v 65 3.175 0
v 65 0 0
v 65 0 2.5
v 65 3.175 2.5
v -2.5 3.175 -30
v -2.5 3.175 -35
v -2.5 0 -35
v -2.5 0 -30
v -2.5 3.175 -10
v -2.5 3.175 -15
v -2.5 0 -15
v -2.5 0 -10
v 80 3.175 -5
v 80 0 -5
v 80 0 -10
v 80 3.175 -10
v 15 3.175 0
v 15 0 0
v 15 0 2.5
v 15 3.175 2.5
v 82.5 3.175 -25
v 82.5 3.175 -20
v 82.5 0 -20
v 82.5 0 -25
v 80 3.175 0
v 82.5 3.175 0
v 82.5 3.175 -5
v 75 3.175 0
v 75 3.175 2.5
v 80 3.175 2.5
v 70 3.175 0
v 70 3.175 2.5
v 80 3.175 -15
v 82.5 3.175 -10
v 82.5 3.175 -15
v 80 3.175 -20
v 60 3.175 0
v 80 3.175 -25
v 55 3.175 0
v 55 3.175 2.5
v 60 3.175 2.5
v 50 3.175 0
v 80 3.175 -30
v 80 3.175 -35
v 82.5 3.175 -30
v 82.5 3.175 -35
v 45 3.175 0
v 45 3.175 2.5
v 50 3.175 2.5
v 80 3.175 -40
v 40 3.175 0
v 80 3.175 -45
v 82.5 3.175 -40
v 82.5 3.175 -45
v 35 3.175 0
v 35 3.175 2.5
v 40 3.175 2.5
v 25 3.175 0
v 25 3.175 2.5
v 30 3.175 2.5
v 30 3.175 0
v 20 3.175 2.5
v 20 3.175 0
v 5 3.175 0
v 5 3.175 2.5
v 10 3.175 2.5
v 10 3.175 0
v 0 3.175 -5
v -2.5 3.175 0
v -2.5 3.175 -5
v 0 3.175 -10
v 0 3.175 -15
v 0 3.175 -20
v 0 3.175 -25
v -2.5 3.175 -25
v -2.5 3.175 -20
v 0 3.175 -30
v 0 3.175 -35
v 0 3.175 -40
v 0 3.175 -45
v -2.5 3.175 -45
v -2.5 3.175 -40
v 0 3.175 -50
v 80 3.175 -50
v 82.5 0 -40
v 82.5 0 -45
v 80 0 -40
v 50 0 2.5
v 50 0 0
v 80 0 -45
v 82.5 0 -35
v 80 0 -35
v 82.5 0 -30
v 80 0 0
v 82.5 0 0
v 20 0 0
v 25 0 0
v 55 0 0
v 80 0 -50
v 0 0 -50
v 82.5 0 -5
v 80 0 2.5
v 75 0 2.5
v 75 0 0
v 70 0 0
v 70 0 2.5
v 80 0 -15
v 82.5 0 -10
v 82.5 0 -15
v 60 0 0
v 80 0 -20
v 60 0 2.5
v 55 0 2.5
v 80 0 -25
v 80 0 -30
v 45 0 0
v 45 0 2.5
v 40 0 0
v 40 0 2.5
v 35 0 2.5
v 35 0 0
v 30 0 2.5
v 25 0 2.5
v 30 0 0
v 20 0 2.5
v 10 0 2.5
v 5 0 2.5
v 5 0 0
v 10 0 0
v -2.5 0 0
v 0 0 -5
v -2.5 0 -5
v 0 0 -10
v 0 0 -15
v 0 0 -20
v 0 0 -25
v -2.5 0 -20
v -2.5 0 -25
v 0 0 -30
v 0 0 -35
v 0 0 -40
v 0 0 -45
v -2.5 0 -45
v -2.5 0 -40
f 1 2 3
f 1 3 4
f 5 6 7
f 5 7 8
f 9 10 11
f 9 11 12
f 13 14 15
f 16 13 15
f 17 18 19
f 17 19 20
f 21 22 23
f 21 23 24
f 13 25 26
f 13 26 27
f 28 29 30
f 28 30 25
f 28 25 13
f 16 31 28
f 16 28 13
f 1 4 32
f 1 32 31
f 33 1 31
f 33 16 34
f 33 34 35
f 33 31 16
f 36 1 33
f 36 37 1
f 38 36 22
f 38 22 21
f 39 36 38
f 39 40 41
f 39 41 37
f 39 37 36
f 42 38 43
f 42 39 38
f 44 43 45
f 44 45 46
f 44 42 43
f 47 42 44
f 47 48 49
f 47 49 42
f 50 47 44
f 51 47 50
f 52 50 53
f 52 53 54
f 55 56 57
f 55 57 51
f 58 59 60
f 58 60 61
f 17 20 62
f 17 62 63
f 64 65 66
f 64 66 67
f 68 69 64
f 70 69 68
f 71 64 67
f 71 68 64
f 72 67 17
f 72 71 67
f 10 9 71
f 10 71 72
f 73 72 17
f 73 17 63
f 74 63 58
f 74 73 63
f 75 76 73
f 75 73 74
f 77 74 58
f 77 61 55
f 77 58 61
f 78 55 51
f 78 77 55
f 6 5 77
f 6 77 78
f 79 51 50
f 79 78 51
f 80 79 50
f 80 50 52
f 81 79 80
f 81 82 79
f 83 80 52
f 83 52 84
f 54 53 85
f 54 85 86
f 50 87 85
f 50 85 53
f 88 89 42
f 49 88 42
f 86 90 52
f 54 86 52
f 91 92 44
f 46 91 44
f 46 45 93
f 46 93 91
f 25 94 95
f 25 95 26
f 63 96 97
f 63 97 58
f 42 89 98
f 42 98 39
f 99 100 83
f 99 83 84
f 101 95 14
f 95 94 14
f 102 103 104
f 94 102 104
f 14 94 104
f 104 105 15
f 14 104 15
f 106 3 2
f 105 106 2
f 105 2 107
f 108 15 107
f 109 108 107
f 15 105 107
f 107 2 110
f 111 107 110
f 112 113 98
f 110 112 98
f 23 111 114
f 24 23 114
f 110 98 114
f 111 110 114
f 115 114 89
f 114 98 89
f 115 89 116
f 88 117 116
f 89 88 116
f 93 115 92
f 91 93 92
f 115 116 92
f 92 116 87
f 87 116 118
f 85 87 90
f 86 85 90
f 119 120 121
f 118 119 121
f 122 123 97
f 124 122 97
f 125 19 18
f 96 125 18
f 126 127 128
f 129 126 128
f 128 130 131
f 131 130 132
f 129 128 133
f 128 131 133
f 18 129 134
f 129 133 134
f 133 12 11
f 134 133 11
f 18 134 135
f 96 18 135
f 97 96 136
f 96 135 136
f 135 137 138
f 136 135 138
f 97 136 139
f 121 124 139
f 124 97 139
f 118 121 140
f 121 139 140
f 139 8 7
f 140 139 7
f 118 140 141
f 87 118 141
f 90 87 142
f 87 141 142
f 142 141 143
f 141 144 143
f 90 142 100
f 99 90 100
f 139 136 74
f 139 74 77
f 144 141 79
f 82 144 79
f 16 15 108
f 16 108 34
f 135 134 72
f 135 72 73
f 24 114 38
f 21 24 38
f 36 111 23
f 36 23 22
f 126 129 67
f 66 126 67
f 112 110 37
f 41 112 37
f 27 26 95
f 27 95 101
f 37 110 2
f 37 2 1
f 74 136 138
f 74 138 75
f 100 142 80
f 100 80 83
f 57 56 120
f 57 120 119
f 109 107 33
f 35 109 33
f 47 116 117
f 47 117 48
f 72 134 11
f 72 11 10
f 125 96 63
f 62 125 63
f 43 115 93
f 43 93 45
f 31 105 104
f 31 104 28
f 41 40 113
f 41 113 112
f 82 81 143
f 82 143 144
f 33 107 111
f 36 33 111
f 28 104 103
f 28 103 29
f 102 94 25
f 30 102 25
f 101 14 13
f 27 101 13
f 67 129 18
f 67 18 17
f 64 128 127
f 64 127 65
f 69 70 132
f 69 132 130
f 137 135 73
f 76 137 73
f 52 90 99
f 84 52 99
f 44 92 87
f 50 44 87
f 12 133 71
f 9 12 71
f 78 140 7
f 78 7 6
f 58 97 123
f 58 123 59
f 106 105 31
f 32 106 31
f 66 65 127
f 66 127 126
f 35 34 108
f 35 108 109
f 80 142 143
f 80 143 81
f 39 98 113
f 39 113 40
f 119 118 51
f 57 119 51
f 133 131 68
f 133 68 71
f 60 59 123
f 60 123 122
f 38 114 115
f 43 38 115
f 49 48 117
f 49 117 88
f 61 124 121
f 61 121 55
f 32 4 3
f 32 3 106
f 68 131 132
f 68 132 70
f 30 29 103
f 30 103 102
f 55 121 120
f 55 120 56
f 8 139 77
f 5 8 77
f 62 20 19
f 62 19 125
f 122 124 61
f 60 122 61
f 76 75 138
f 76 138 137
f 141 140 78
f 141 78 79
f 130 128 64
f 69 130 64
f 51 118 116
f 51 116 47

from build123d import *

# Parameters (mm, degrees)
SKETCH1_W           = 80
SKETCH1_H           = 50
BOSS_EXTRUDE1_DEPTH = 3.175
SKETCH2_W           = 5
SKETCH2_H           = 3.175
BOSS_EXTRUDE2_DEPTH = 2.5
LPATTERN1_COUNT     = 5
LPATTERN1_PITCH     = 10
SKETCH3_W           = 5
SKETCH3_H           = 3.175
BOSS_EXTRUDE3_DEPTH = 2.5
LPATTERN2_COUNT     = 5
LPATTERN2_PITCH     = 10
SKETCH4_W           = 5
SKETCH4_H           = 3.175
BOSS_EXTRUDE4_DEPTH = 2.5
LPATTERN3_COUNT     = 8
LPATTERN3_PITCH     = 10


with BuildPart() as part:
    # Sketch1 → Boss-Extrude1 (new body)
    with BuildSketch(Plane(origin=(0, 0, 0), x_dir=(1, 0, 0), z_dir=(0, 1, 0))):
        with Locations((40, 25)):
            Rectangle(SKETCH1_W, SKETCH1_H)
    extrude(amount=BOSS_EXTRUDE1_DEPTH)

    # Sketch2 → Boss-Extrude2 (add)
    with BuildSketch(Plane.ZY):
        with Locations((-2.5, 1.5875)):
            Rectangle(SKETCH2_W, SKETCH2_H)
    boss_extrude2 = extrude(amount=BOSS_EXTRUDE2_DEPTH)

    # LPattern1: Boss-Extrude2 ×5
    with Locations(*[(0, 0, -i * LPATTERN1_PITCH) for i in range(1, LPATTERN1_COUNT)]):
        add(boss_extrude2)

    # Sketch3 → Boss-Extrude3 (add)
    with BuildSketch(Plane(origin=(80, 0, 0), x_dir=(0, 0, -1), z_dir=(1, 0, 0))):
        with Locations((2.5, 1.5875)):
            Rectangle(SKETCH3_W, SKETCH3_H)
    boss_extrude3 = extrude(amount=BOSS_EXTRUDE3_DEPTH)

    # LPattern2: Boss-Extrude3 ×5
    with Locations(*[(0, 0, -i * LPATTERN2_PITCH) for i in range(1, LPATTERN2_COUNT)]):
        add(boss_extrude3)

    # Sketch4 → Boss-Extrude4 (add)
    with BuildSketch(Plane.XY):
        with Locations((77.5, 1.5875)):
            Rectangle(SKETCH4_W, SKETCH4_H)
    boss_extrude4 = extrude(amount=BOSS_EXTRUDE4_DEPTH)

    # LPattern3: Boss-Extrude4 ×8
    with Locations(*[(-i * LPATTERN3_PITCH, 0, 0) for i in range(1, LPATTERN3_COUNT)]):
        add(boss_extrude4)


solid = part.part
